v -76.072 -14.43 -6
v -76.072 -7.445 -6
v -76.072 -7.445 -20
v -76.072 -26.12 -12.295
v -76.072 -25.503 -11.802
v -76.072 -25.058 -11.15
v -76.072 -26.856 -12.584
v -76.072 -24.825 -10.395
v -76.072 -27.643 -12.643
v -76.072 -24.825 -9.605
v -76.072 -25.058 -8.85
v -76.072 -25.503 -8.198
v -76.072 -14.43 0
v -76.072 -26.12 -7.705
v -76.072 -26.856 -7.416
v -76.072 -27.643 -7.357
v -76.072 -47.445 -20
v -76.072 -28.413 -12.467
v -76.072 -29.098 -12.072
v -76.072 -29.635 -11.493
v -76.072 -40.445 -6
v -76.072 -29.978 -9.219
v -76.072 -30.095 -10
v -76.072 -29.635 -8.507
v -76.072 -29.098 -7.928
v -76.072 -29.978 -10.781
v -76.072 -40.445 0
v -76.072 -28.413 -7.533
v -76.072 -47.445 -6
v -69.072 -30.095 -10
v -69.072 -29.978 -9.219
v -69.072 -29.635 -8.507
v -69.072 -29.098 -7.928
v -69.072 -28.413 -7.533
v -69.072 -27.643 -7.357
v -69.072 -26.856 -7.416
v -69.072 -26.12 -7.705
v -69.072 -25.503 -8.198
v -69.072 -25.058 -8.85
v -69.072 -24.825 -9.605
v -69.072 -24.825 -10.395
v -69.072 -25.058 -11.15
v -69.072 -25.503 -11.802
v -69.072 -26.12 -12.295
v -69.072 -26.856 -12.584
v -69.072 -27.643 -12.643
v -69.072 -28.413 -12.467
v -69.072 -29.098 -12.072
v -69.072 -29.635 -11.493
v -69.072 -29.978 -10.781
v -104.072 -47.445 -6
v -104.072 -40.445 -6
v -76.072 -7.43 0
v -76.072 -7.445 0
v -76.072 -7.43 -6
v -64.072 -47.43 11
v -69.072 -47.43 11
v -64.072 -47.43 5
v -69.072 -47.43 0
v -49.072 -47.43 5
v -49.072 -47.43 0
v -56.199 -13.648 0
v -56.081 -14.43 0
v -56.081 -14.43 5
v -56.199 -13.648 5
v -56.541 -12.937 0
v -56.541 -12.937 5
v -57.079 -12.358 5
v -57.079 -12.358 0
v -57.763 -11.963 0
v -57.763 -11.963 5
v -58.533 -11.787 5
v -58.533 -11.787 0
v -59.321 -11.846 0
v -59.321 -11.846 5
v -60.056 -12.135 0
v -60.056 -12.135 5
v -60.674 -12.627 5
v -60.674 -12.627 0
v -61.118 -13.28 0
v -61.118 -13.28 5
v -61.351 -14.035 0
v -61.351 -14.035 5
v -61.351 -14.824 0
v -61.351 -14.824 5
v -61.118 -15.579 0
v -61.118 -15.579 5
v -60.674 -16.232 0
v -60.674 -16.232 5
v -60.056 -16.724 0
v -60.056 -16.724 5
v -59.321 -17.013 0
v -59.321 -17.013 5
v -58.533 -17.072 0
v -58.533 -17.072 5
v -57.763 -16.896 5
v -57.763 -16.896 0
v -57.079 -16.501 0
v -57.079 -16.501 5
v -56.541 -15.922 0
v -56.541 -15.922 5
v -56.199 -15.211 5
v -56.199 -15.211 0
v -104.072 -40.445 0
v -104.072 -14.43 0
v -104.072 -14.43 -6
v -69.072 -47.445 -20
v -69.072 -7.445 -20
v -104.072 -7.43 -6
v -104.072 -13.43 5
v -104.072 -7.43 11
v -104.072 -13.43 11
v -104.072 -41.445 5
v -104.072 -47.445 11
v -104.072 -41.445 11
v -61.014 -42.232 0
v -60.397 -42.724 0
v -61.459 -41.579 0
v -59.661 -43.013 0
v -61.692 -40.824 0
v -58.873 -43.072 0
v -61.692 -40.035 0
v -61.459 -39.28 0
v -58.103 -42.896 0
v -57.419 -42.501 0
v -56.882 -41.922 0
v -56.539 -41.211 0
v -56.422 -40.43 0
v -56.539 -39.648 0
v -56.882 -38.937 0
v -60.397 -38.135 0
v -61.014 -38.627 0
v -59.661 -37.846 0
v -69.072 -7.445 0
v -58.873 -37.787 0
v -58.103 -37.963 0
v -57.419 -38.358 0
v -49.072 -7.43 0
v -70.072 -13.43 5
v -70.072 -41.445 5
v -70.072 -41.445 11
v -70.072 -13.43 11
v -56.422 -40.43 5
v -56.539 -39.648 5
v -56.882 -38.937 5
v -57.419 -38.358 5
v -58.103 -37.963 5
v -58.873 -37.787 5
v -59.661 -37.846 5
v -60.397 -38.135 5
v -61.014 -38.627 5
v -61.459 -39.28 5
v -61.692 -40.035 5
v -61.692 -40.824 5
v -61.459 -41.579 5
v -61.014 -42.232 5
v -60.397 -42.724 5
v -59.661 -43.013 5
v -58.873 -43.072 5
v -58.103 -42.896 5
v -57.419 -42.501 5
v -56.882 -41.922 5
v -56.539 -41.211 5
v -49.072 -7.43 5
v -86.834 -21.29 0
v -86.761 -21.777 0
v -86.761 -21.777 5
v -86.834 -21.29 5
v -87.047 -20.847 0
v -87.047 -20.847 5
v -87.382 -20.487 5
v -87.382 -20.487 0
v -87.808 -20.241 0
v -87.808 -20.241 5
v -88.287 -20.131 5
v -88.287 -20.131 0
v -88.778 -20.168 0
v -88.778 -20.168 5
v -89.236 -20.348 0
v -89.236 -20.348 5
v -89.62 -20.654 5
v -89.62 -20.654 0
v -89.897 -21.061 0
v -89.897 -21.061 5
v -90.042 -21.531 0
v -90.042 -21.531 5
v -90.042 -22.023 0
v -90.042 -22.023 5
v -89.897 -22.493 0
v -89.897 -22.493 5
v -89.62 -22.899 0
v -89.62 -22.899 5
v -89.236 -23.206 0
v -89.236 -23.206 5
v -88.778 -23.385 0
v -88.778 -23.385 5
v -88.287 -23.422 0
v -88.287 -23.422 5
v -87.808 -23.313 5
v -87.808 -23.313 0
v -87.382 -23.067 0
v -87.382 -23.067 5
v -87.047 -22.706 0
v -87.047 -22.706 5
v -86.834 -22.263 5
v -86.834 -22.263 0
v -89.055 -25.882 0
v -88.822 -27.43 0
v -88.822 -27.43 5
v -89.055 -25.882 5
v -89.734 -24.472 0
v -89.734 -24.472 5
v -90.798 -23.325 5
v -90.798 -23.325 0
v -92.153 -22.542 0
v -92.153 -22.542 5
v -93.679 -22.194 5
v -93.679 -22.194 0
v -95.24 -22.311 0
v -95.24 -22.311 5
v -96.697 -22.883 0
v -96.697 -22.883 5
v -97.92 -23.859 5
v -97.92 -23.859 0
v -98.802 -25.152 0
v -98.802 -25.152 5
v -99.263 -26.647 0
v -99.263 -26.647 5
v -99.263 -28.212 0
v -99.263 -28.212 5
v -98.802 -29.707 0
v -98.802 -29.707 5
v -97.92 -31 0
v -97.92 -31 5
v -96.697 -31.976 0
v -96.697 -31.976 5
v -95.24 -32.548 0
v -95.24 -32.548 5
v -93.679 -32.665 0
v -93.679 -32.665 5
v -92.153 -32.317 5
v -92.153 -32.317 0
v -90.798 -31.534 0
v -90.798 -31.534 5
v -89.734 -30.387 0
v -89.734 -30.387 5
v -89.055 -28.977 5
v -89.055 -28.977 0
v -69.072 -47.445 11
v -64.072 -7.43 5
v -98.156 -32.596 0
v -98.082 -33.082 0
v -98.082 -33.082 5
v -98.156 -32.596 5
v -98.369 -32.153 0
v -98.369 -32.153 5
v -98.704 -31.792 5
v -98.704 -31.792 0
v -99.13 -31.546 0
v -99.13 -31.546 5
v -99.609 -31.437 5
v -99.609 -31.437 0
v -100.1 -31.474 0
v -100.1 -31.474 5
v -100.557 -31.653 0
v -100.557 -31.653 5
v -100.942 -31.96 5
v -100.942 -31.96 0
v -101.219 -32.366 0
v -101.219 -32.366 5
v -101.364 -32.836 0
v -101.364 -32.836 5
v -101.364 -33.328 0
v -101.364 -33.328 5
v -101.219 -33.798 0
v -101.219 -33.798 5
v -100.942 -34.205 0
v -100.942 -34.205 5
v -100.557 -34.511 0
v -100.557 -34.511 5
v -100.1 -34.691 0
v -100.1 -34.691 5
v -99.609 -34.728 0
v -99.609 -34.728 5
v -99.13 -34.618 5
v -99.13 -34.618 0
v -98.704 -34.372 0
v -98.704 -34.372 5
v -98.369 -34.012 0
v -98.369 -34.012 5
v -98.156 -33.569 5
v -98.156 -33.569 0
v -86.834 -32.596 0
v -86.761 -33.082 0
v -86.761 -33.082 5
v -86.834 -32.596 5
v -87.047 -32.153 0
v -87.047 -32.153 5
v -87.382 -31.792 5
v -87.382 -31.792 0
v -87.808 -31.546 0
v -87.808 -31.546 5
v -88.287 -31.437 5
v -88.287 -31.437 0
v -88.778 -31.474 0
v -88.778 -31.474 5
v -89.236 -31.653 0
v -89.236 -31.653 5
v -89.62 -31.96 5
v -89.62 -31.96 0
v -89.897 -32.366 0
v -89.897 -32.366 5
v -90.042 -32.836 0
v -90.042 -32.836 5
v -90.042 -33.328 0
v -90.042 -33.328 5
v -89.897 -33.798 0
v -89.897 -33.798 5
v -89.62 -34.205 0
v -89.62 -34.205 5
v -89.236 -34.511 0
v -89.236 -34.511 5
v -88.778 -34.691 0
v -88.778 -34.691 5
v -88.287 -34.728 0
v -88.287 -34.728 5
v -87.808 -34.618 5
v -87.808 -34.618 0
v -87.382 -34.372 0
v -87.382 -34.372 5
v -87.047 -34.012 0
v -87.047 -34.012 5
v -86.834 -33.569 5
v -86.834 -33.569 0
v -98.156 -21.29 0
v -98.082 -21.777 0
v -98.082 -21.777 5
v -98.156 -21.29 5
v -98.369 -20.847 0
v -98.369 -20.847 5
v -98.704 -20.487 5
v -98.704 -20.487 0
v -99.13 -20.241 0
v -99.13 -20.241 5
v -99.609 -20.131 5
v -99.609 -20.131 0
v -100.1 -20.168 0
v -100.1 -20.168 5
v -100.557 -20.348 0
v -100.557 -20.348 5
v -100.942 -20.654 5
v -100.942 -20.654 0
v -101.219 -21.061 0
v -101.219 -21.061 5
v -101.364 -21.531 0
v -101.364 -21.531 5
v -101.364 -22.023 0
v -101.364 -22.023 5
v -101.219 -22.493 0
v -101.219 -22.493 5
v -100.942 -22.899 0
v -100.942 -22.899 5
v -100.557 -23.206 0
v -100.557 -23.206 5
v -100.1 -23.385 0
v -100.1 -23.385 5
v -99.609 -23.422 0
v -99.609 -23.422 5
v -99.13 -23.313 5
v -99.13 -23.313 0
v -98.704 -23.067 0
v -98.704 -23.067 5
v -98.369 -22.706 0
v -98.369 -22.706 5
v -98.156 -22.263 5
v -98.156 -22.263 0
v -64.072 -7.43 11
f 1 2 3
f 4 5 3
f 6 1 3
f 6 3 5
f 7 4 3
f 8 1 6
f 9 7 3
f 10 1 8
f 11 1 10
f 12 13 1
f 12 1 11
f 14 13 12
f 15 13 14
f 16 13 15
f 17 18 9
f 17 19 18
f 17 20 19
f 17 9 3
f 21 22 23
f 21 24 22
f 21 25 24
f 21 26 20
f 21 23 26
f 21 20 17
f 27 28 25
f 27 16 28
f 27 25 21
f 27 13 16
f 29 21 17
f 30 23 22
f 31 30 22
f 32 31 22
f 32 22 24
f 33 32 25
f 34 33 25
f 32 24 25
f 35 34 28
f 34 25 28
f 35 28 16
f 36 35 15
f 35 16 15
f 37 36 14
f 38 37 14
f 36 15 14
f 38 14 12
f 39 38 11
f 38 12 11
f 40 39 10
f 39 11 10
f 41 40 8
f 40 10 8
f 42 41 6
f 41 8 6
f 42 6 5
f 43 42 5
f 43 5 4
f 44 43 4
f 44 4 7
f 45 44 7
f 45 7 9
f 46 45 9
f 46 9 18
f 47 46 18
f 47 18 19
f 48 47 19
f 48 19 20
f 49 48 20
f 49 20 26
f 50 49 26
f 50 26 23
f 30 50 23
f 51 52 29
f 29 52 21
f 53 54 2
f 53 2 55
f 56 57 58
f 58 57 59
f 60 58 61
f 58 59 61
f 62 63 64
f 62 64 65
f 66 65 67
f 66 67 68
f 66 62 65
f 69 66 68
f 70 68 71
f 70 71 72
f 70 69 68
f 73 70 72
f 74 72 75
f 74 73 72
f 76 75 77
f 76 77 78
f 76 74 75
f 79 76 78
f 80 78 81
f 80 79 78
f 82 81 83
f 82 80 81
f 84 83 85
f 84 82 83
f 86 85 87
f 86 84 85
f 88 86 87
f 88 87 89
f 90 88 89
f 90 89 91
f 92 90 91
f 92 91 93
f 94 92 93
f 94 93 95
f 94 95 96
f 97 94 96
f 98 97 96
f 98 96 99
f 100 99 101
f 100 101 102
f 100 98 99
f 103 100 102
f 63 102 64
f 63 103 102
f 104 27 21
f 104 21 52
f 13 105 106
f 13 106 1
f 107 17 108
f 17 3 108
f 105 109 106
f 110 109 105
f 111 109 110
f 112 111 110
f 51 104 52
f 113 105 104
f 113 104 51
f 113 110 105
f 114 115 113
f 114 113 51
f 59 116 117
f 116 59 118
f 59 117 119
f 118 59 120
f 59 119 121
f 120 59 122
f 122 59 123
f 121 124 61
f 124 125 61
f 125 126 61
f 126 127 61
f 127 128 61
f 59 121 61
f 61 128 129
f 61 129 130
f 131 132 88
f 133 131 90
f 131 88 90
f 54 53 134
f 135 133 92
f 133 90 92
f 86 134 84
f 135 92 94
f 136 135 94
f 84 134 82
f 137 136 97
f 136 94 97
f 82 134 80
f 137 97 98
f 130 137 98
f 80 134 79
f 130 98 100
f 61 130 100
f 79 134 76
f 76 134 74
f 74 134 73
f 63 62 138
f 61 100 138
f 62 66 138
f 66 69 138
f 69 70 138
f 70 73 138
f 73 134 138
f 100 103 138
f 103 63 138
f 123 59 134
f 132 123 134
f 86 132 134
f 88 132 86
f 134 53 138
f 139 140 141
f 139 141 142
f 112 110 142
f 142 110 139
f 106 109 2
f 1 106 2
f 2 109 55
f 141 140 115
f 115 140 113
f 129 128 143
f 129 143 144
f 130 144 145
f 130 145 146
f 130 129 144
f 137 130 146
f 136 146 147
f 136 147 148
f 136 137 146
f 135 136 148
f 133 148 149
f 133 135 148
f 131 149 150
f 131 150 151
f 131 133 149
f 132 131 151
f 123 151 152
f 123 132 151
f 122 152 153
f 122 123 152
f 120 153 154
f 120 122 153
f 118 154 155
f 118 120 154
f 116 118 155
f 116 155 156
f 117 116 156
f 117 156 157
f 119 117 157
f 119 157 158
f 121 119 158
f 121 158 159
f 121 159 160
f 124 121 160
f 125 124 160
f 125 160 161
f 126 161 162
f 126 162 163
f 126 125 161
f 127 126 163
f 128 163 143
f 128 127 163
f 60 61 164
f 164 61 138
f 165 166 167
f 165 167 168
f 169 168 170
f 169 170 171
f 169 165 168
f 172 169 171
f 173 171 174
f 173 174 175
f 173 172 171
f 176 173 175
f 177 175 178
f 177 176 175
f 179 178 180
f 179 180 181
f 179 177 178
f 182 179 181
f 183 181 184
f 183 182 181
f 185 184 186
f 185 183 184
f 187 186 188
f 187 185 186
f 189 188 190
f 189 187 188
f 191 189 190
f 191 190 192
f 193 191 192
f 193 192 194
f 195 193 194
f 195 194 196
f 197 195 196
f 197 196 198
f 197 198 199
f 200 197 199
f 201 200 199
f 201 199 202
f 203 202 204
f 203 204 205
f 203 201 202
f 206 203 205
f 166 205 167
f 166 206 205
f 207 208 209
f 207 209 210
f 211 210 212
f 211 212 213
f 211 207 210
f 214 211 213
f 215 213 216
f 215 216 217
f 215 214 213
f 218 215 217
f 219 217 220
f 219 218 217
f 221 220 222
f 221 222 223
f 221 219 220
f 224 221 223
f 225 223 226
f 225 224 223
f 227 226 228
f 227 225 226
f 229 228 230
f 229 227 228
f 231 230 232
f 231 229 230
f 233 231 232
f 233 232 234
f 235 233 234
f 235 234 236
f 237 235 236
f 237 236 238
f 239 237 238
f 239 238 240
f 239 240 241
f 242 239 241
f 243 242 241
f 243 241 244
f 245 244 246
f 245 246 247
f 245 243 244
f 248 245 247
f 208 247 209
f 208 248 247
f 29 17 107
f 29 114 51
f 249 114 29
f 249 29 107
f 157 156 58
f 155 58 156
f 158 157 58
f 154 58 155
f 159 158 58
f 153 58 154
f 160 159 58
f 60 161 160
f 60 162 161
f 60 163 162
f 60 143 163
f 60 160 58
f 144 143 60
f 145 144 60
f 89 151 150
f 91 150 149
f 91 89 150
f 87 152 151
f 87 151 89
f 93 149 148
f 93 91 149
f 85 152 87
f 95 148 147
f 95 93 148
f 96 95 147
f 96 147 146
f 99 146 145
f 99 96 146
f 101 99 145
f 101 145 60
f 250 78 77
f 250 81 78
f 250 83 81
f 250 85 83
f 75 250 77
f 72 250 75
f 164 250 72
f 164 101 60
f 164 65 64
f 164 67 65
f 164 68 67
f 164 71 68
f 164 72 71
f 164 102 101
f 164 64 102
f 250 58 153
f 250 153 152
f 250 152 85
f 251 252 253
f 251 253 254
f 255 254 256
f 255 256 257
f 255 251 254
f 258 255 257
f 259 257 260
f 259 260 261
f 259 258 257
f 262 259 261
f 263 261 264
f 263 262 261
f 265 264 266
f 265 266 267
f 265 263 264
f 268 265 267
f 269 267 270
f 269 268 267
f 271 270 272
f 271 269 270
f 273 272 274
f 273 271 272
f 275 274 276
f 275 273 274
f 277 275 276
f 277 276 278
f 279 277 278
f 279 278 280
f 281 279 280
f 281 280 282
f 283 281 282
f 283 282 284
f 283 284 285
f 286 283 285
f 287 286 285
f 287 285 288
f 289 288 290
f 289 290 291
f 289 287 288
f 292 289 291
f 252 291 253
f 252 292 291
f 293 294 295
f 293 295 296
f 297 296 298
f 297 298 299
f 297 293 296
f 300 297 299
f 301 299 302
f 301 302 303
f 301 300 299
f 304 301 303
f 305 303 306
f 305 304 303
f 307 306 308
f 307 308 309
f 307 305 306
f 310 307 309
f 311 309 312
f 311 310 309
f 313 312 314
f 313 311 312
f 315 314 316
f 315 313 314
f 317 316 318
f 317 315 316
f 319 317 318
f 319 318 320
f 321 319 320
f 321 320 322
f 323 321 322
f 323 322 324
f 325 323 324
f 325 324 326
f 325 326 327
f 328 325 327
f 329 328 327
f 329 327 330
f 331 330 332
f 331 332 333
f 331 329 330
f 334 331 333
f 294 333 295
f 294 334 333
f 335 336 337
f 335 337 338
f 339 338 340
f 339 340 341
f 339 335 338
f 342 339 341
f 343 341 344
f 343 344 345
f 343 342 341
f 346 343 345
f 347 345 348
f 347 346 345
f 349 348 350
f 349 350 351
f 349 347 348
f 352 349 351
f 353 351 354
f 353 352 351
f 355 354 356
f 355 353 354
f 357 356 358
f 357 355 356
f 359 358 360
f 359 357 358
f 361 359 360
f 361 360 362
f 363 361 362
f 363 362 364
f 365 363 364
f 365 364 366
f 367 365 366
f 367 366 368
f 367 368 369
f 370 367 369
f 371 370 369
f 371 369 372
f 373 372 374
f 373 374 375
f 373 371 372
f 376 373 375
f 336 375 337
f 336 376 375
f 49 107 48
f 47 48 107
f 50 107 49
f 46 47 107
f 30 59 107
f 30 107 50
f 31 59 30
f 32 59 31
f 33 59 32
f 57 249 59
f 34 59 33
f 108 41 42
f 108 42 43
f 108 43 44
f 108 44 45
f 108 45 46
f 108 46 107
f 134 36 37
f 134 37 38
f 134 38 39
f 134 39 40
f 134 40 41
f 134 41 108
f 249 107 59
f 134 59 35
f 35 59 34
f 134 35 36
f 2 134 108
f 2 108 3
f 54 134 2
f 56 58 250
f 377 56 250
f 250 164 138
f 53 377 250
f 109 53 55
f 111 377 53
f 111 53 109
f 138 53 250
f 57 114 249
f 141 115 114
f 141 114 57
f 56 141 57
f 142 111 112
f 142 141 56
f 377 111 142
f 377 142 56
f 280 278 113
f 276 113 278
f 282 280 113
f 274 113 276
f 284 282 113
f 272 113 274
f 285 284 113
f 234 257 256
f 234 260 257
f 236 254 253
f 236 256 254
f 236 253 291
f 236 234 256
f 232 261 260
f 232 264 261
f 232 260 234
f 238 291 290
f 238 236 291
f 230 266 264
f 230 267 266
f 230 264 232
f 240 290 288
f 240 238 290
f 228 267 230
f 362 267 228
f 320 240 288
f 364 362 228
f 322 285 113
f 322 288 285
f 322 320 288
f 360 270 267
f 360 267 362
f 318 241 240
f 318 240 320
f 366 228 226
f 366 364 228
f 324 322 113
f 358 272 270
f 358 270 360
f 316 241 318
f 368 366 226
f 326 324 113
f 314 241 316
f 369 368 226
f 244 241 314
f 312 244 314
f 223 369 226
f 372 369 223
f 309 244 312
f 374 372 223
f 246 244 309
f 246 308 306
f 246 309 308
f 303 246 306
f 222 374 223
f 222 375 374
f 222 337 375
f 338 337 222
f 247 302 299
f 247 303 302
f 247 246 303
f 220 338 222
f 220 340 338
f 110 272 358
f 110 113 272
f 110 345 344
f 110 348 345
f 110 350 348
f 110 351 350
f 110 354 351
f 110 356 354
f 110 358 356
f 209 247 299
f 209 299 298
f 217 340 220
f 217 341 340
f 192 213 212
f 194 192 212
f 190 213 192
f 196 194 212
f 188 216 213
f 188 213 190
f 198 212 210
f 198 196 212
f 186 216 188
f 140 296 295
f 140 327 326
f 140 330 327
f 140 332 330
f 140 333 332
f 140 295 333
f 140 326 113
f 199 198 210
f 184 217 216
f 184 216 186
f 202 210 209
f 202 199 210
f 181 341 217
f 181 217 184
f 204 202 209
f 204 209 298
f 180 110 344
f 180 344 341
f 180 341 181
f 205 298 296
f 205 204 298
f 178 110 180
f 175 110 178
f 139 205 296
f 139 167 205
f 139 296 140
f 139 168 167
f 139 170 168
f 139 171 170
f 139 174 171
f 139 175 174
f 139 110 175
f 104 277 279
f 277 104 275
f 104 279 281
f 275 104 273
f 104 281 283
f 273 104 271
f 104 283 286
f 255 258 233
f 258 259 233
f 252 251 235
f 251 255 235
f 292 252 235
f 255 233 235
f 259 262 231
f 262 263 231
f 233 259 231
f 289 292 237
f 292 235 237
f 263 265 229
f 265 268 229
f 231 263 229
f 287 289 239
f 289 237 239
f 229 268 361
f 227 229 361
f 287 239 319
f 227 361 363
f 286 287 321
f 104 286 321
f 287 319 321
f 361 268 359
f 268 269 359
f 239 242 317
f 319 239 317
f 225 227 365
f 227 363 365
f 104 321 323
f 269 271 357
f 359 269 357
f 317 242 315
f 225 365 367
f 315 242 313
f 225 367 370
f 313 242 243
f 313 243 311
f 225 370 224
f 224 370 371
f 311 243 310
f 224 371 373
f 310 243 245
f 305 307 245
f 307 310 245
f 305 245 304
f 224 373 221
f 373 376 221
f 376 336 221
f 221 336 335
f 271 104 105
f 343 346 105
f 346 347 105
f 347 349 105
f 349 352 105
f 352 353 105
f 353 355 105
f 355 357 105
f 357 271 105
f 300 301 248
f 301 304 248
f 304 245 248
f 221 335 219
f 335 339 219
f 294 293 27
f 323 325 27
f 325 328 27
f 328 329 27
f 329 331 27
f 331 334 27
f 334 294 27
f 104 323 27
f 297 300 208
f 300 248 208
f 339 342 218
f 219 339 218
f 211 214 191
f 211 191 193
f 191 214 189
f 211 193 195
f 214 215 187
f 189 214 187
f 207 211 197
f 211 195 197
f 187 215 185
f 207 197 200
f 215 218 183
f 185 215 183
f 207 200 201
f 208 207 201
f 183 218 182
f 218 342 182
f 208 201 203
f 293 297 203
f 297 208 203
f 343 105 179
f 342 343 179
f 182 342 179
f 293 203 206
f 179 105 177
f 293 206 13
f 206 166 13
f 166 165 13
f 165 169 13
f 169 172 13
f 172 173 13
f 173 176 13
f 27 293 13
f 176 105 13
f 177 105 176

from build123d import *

# Parameters (mm, degrees)
F0_R     = 1.65
F0_R_2   = 5.25
F0_W     = 20
F0_H     = 40
F0_R_3   = 2.65
F1_DEPTH = 5
F2_W     = 6
F2_H     = 28.0157411588
F3_DEPTH = 6
F5_DEPTH = 20
F6_R     = 2.65
F7_DEPTH = 25
F9_DEPTH = 6


with BuildPart() as f1:
    # F0 (on Top) → F1 (new body)
    with BuildSketch(Plane.XY):
        Polygon((-69.0715216601, -47.4452535896), (-69.0715216601, -47.4295124308), (-69.0715216601, -7.4295124308), (-99.0715216601, -7.4295124308), (-104.0715216601, -7.4295124308), (-104.0715216601, -17.4295124308), (-104.0715216601, -37.4295124308), (-104.0715216601, -47.4452535896), (-99.1652225519, -47.4452535896), align=None)
        with Locations((-99.7324526625, -33.0822869872)):
            Circle(F0_R, mode=Mode.SUBTRACT)
        with Locations((-88.4105906576, -33.0822869872)):
            Circle(F0_R, mode=Mode.SUBTRACT)
        with Locations((-94.0715216601, -27.4295124308)):
            Circle(F0_R_2, mode=Mode.SUBTRACT)
        with Locations((-99.7324526625, -21.7767378744)):
            Circle(F0_R, mode=Mode.SUBTRACT)
        with Locations((-88.4105906576, -21.7767378744)):
            Circle(F0_R, mode=Mode.SUBTRACT)
        with Locations((-59.0715216601, -27.4295124308)):
            Rectangle(F0_W, F0_H)
        with Locations((-59.0715216601, -40.4295124308)):
            Circle(F0_R_3, mode=Mode.SUBTRACT)
        with Locations((-58.7309271957, -14.4295124308)):
            Circle(F0_R_3, mode=Mode.SUBTRACT)
    extrude(amount=F1_DEPTH)

    # F2 (on face) → F3 (join)
    with BuildSketch(Plane.XY.offset(5)):
        Polygon((-64.0715216601, -7.4295124308), (-104.0715216601, -7.4295124308), (-104.0715216601, -13.4295124308), (-70.0715216601, -13.4295124308), (-64.0715216601, -13.4295124308), align=None)
        with Locations((-67.0715216601, -27.4373830102)):
            Rectangle(F2_W, F2_H)
        Polygon((-70.0715216601, -41.4452535896), (-104.0715216601, -41.4452535896), (-104.0715216601, -47.4452535896), (-69.0715216601, -47.4452535896), (-69.0715216601, -47.4295124308), (-64.0715216601, -47.4295124308), (-64.0715216601, -41.4452535896), align=None)
    extrude(amount=F3_DEPTH)

    # F4 (on face) → F5 (join)
    with BuildSketch(Plane.XY):
        Polygon((-76.0715216601, -47.4452535896), (-69.0715216601, -47.4452535896), (-69.0715216601, -47.4295124308), (-69.0715216601, -7.4452535896), (-76.0715216601, -7.4452535896), align=None)
    extrude(amount=-F5_DEPTH)

    # F6 (on face) → F7 (cut)
    with BuildSketch(Plane(origin=(-76.0715216601, 0, 0), x_dir=(0, -1, 0), z_dir=(-1, 0, 0))):
        with Locations((27.4452535896, -10)):
            Circle(F6_R)
    extrude(amount=-F7_DEPTH, mode=Mode.SUBTRACT)

    # F8 (on face) → F9 (join)
    with BuildSketch(Plane.XY):
        Polygon((-99.1652225519, -47.4452535896), (-76.0715216601, -47.4452535896), (-76.0715216601, -40.4452535896), (-104.0715216601, -40.4452535896), (-104.0715216601, -47.4452535896), align=None)
        Polygon((-76.0715216601, -14.4295124308), (-76.0715216601, -7.4295124308), (-99.0715216601, -7.4295124308), (-104.0715216601, -7.4295124308), (-104.0715216601, -14.4295124308), align=None)
    extrude(amount=-F9_DEPTH)


solid = f1.part
